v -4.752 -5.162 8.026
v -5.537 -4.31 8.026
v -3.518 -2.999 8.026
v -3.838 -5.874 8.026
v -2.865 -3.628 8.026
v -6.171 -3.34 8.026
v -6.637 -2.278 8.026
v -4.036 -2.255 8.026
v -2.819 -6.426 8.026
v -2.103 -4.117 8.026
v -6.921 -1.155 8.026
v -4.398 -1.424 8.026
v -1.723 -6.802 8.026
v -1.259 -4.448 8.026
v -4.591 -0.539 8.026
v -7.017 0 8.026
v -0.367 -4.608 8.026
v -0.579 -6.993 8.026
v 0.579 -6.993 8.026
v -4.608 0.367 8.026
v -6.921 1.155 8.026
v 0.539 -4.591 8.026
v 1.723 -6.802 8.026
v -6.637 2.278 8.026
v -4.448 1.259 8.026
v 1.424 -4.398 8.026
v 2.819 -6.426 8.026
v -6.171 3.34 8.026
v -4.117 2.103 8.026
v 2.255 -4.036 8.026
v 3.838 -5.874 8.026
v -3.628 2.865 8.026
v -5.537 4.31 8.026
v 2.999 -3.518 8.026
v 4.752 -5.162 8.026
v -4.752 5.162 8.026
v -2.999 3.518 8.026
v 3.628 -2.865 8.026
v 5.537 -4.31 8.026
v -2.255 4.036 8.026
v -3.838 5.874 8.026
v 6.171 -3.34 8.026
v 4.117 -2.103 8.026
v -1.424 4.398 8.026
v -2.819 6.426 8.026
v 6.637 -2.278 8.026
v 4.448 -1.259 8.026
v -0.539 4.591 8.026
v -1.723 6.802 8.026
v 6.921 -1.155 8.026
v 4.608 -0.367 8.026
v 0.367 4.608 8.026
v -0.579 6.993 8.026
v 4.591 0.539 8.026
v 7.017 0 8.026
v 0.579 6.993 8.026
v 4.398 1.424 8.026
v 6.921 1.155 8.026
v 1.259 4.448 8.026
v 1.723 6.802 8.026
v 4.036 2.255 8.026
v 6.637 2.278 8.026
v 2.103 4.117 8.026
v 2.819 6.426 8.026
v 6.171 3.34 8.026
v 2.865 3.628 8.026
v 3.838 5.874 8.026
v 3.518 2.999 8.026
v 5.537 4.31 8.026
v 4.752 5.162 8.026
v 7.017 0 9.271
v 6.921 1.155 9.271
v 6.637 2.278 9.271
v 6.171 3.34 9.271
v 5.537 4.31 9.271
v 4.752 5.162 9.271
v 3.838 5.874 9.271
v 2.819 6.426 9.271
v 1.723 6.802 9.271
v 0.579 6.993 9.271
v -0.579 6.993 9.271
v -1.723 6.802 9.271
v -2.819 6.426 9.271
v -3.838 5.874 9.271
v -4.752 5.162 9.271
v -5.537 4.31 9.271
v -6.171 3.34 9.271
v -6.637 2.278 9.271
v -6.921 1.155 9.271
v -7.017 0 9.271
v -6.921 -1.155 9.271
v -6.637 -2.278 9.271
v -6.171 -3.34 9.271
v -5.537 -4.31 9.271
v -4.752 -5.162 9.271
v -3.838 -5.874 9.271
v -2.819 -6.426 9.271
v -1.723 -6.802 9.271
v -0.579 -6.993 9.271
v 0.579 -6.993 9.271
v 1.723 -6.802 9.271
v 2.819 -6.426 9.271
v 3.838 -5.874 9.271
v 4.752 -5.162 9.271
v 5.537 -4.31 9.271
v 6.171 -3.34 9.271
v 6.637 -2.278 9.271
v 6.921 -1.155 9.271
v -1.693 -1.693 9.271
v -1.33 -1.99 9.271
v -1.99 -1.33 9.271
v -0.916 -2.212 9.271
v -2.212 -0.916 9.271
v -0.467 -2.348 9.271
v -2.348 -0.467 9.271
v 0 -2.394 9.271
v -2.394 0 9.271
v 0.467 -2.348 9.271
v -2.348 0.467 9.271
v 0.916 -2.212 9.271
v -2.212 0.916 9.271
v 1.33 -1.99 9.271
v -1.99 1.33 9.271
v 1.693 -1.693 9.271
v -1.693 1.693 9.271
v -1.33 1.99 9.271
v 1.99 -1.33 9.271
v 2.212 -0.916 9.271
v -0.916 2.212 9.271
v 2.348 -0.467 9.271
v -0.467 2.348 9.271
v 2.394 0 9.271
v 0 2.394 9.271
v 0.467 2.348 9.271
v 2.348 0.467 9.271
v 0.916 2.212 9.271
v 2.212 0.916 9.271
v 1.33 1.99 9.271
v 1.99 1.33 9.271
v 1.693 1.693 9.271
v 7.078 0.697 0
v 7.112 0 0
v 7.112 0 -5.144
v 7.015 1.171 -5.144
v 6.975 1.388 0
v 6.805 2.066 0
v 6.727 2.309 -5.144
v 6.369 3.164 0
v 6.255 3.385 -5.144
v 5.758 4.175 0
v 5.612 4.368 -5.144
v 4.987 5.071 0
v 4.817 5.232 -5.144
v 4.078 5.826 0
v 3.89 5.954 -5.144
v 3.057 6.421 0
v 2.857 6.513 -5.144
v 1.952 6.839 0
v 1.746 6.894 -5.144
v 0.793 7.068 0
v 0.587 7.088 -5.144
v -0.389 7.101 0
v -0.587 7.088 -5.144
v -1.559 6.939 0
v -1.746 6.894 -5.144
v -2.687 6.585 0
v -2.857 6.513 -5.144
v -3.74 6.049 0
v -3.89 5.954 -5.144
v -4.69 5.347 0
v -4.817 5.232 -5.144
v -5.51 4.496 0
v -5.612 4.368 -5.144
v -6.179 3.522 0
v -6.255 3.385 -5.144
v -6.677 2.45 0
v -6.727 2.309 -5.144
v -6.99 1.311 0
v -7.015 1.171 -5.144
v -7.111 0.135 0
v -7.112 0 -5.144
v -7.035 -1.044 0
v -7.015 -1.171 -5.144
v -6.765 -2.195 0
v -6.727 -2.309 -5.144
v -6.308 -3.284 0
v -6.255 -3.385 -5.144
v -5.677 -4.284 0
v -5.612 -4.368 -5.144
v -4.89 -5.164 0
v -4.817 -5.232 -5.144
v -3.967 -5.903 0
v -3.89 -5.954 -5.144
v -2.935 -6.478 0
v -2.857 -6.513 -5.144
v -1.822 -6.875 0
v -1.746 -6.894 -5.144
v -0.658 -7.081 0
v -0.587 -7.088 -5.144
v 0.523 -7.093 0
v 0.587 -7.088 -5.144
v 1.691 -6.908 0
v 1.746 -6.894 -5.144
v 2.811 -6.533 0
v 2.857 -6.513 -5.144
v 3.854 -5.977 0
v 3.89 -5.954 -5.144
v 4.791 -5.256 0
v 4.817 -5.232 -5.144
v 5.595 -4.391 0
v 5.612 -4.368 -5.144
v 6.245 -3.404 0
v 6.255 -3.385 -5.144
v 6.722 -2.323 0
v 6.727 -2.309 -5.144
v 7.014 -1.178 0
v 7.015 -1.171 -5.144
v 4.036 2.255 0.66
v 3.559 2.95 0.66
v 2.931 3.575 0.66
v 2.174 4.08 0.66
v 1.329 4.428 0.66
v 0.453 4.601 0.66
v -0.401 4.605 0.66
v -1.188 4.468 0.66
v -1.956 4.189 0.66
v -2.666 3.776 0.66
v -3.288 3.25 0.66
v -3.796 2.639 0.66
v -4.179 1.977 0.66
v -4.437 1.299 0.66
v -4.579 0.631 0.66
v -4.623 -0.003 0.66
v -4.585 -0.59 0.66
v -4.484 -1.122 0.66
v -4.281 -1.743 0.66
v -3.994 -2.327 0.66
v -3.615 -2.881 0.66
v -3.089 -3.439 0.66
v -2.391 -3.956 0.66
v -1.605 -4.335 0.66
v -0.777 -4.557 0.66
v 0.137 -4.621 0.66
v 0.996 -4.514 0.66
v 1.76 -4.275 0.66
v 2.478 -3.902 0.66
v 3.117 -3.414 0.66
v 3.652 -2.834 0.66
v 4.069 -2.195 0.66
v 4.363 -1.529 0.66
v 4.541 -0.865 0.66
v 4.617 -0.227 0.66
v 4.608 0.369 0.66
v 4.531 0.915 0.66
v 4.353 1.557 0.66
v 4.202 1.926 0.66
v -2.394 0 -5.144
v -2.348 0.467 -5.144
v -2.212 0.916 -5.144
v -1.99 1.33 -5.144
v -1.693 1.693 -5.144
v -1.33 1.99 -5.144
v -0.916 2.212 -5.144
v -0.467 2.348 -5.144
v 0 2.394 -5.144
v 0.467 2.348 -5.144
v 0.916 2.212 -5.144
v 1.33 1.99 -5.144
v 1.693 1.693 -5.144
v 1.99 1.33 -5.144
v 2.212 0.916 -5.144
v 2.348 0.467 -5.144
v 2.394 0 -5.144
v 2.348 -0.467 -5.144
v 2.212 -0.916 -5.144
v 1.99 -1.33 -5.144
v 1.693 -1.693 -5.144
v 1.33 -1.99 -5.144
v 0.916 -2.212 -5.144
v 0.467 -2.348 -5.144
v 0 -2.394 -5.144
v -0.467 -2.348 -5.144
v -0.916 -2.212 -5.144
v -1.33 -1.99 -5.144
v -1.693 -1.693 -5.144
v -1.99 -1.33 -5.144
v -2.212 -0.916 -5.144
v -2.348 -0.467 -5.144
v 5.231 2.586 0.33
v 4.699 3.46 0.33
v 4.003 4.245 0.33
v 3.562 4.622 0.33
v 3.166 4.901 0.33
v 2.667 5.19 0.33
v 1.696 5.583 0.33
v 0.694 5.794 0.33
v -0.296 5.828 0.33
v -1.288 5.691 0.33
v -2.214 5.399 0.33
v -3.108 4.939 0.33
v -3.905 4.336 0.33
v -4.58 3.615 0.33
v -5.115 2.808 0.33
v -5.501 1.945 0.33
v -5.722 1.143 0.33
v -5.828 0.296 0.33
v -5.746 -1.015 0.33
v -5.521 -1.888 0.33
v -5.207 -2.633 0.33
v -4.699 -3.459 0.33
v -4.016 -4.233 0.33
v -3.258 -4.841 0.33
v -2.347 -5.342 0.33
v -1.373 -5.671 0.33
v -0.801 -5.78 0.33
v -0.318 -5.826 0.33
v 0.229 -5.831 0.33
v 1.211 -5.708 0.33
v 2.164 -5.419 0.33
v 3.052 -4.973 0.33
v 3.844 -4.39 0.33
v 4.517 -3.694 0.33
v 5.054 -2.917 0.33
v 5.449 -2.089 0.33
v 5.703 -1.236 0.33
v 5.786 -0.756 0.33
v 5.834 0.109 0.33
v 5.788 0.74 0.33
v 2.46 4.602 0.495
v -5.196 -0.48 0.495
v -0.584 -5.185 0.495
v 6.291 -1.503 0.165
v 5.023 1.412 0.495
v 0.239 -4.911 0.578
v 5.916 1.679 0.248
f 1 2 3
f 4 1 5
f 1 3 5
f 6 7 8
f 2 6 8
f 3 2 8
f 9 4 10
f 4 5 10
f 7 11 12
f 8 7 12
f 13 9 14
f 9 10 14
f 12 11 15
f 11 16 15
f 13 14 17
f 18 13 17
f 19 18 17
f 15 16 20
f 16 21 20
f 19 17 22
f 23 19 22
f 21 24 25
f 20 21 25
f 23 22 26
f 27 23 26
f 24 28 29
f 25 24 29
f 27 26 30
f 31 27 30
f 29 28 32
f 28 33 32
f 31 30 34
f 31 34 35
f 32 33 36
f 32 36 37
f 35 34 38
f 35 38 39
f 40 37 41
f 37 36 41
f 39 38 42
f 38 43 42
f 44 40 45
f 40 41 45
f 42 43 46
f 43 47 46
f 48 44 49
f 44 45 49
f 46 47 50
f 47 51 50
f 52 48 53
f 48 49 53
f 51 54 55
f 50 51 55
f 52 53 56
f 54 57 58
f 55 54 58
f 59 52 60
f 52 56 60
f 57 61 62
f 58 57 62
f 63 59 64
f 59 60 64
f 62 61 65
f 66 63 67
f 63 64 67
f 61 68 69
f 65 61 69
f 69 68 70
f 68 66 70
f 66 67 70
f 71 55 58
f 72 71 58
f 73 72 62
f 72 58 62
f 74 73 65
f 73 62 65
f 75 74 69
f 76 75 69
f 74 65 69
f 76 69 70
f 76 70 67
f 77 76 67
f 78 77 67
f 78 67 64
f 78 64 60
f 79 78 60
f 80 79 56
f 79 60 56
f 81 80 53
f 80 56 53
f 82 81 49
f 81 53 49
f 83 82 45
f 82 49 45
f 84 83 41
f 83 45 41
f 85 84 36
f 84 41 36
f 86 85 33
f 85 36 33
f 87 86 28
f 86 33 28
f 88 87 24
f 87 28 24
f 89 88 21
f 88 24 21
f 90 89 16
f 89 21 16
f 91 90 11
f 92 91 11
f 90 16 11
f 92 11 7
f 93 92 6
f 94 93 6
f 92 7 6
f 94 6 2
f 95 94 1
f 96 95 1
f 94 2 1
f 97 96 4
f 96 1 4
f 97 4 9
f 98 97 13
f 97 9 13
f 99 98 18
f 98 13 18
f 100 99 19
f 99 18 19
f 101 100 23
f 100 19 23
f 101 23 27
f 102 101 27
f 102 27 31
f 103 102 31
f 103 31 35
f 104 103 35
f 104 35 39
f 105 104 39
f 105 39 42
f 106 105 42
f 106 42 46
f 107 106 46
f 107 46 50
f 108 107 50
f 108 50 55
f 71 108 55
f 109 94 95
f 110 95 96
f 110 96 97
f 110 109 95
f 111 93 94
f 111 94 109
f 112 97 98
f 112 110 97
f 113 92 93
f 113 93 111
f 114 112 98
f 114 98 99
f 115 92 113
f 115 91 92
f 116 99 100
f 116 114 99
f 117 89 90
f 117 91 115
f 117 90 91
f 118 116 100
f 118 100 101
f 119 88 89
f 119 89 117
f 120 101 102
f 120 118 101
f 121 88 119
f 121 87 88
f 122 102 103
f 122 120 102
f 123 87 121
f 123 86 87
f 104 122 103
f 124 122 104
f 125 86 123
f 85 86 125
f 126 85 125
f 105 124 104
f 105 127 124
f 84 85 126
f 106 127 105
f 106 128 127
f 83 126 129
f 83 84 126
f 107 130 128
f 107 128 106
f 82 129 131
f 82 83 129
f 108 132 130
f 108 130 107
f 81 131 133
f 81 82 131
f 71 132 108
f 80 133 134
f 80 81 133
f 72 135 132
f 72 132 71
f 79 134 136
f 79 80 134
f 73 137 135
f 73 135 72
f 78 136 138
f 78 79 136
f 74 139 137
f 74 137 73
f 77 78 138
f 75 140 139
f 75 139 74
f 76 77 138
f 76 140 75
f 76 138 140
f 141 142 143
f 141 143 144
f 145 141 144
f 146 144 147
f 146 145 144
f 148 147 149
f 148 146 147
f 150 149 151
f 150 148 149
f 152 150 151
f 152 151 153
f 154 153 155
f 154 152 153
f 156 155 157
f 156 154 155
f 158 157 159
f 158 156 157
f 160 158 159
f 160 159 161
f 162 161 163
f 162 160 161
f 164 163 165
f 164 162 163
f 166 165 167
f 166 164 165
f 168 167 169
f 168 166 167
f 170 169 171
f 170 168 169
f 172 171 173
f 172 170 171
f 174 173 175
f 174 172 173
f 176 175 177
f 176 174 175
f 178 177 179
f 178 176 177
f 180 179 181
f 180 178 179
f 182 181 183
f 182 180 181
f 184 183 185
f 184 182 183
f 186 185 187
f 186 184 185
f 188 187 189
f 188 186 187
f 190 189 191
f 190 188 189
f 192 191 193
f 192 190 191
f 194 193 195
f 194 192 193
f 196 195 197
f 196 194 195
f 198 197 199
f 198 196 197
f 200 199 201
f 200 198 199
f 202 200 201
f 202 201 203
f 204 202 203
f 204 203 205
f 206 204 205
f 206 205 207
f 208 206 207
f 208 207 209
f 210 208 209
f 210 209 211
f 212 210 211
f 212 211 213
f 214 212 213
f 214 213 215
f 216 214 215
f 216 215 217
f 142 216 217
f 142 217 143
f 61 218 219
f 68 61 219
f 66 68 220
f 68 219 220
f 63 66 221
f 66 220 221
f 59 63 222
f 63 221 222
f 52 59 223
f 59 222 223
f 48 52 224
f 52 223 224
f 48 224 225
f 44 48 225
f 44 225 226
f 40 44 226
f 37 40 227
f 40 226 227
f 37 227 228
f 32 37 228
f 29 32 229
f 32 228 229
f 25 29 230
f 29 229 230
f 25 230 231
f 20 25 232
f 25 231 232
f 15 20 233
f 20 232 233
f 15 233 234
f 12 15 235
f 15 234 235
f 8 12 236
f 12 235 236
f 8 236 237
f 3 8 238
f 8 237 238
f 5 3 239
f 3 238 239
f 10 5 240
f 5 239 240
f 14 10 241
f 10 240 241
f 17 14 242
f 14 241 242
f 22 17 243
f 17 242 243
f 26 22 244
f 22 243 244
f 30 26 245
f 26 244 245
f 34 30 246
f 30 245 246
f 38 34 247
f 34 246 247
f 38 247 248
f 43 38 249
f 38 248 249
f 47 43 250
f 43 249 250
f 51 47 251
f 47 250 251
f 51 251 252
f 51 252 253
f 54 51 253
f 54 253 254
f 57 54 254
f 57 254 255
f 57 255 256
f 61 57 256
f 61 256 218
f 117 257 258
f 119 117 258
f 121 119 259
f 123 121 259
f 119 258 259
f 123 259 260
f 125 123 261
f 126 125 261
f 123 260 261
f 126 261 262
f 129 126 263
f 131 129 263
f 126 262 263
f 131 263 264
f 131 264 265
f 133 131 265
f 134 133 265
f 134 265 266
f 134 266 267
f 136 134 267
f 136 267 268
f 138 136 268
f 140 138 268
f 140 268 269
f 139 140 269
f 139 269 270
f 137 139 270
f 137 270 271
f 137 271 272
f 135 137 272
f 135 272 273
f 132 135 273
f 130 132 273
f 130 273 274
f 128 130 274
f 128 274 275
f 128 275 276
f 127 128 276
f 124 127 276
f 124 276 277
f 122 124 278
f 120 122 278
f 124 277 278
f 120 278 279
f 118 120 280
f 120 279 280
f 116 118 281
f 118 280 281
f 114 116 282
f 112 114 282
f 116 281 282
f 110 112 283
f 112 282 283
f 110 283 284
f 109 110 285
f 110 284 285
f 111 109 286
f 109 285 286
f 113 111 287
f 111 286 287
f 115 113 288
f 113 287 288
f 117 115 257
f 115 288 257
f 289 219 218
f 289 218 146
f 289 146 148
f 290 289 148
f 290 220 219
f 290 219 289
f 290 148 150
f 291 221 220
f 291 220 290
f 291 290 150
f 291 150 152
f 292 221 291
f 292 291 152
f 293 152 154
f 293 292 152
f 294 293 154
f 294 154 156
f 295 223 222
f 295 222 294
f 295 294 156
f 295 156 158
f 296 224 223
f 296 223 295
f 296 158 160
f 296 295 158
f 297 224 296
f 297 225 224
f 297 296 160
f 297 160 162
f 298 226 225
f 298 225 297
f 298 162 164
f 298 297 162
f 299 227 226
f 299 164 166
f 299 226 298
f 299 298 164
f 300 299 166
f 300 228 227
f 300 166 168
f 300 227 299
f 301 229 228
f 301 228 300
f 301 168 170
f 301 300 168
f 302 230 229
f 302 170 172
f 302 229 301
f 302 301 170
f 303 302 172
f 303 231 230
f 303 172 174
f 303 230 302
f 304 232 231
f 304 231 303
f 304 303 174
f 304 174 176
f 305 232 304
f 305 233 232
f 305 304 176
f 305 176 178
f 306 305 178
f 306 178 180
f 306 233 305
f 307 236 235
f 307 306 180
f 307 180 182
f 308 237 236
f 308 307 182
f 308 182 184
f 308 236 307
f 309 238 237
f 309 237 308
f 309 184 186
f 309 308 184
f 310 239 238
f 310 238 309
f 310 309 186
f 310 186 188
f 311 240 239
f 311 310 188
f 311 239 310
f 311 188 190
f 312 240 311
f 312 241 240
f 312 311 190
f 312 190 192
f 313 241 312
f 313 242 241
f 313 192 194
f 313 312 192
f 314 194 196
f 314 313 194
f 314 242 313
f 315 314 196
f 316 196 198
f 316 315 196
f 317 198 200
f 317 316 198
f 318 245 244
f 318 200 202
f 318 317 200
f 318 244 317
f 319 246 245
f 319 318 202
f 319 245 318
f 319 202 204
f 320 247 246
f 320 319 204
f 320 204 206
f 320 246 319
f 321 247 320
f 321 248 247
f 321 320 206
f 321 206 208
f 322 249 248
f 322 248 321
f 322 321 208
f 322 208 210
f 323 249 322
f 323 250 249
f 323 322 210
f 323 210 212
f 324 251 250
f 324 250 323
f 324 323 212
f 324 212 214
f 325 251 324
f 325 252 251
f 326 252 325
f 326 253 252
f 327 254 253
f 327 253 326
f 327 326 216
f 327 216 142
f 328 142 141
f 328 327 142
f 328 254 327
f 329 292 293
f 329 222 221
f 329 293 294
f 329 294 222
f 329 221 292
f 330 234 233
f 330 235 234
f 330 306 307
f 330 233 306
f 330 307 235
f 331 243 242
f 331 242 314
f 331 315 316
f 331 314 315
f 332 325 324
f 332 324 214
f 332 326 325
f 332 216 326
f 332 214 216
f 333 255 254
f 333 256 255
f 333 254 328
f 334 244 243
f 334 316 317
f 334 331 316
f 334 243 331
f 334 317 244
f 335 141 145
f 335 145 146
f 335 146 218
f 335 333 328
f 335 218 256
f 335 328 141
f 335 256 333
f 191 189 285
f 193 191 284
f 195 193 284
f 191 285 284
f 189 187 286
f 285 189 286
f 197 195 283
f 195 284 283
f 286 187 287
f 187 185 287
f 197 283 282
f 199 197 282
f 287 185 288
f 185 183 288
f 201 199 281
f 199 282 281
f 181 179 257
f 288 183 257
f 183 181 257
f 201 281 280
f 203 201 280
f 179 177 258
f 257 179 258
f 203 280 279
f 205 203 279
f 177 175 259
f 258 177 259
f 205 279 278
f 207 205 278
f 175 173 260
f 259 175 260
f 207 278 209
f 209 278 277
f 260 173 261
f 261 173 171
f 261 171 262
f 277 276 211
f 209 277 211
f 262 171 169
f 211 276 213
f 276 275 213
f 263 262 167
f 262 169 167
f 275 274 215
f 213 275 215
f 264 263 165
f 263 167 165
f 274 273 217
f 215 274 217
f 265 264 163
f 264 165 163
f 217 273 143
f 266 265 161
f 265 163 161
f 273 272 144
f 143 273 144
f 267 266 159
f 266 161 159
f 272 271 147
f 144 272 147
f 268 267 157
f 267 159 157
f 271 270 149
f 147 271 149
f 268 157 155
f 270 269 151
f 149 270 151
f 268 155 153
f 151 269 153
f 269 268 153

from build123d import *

# Parameters (mm, degrees)
SKETCH1_R           = 7.112
BOSS_EXTRUDE1_DEPTH = 5.1435
SKETCH2_2_R         = 4.6228
BOSS_EXTRUDE2_DEPTH = 7.366
SKETCH4_R           = 7.01675
BOSS_EXTRUDE3_DEPTH = 1.2446
SKETCH6_R           = 2.39395
CUT_EXTRUDE1_DEPTH  = 18.576657848


with BuildPart() as part:
    # Sketch1 → Boss-Extrude1 (new body)
    with BuildSketch(Plane.XY):
        Circle(SKETCH1_R)
    extrude(amount=-BOSS_EXTRUDE1_DEPTH)

    # Loft1: read off the stored shape, not the designer's step
    # Loft1: loft between two sections, ruled curve by curve
    loft1_from = [
        Edge.make_bspline([(6.805435292, 2.065573645, 0), (2.674288001, 15.67644423, 0), (-10.936582583, 11.545296939, 0), (-6.805435292, -2.065573645, 0), (-2.674288001, -15.67644423, 0), (10.936582583, -11.545296939, 0), (6.805435292, 2.065573645, 0)], [0, 0, 0, 0, 0.5, 0.5, 0.5, 1, 1, 1, 1], 3, [1, 0.333333333, 0.333333333, 1, 0.333333333, 0.333333333, 1]),
    ]
    loft1_to = [
        Edge.make_bspline([(4.035501617, 2.254995907, 0.6604), (-0.474490196, 10.325999141, 0.6604), (-8.54549343, 5.816007327, 0.6604), (-4.035501617, -2.254995907, 0.6604), (0.474490196, -10.325999141, 0.6604), (8.54549343, -5.816007327, 0.6604), (4.035501617, 2.254995907, 0.6604)], [0, 0, 0, 0, 0.5, 0.5, 0.5, 1, 1, 1, 1], 3, [1, 0.333333333, 0.333333333, 1, 0.333333333, 0.333333333, 1]),
    ]
    loft1 = Solid(Shell([*[Face.make_surface_from_curves(loft1_from[k], loft1_to[k]) for k in range(1)], Face(Wire(loft1_from)), Face(Wire(loft1_to))]))
    add(loft1)

    # Sketch2<2> → Boss-Extrude2 (add)
    with BuildSketch(Plane.XY.offset(0.6604)):
        with Locations(Location((0, 0, 0), (0, 0, 29.196))):
            Circle(SKETCH2_2_R)
    extrude(amount=BOSS_EXTRUDE2_DEPTH)

    # Sketch4 → Boss-Extrude3 (add)
    with BuildSketch(Plane.XY.offset(8.0264)):
        Circle(SKETCH4_R)
    extrude(amount=BOSS_EXTRUDE3_DEPTH)

    # Sketch6 → Cut-Extrude1 (cut, through all)
    with BuildSketch(Plane(origin=(0, 0, -5.1435), x_dir=(-1, 0, 0), z_dir=(0, 0, -1))):
        Circle(SKETCH6_R)
    extrude(amount=-CUT_EXTRUDE1_DEPTH, mode=Mode.SUBTRACT)


solid = part.part
